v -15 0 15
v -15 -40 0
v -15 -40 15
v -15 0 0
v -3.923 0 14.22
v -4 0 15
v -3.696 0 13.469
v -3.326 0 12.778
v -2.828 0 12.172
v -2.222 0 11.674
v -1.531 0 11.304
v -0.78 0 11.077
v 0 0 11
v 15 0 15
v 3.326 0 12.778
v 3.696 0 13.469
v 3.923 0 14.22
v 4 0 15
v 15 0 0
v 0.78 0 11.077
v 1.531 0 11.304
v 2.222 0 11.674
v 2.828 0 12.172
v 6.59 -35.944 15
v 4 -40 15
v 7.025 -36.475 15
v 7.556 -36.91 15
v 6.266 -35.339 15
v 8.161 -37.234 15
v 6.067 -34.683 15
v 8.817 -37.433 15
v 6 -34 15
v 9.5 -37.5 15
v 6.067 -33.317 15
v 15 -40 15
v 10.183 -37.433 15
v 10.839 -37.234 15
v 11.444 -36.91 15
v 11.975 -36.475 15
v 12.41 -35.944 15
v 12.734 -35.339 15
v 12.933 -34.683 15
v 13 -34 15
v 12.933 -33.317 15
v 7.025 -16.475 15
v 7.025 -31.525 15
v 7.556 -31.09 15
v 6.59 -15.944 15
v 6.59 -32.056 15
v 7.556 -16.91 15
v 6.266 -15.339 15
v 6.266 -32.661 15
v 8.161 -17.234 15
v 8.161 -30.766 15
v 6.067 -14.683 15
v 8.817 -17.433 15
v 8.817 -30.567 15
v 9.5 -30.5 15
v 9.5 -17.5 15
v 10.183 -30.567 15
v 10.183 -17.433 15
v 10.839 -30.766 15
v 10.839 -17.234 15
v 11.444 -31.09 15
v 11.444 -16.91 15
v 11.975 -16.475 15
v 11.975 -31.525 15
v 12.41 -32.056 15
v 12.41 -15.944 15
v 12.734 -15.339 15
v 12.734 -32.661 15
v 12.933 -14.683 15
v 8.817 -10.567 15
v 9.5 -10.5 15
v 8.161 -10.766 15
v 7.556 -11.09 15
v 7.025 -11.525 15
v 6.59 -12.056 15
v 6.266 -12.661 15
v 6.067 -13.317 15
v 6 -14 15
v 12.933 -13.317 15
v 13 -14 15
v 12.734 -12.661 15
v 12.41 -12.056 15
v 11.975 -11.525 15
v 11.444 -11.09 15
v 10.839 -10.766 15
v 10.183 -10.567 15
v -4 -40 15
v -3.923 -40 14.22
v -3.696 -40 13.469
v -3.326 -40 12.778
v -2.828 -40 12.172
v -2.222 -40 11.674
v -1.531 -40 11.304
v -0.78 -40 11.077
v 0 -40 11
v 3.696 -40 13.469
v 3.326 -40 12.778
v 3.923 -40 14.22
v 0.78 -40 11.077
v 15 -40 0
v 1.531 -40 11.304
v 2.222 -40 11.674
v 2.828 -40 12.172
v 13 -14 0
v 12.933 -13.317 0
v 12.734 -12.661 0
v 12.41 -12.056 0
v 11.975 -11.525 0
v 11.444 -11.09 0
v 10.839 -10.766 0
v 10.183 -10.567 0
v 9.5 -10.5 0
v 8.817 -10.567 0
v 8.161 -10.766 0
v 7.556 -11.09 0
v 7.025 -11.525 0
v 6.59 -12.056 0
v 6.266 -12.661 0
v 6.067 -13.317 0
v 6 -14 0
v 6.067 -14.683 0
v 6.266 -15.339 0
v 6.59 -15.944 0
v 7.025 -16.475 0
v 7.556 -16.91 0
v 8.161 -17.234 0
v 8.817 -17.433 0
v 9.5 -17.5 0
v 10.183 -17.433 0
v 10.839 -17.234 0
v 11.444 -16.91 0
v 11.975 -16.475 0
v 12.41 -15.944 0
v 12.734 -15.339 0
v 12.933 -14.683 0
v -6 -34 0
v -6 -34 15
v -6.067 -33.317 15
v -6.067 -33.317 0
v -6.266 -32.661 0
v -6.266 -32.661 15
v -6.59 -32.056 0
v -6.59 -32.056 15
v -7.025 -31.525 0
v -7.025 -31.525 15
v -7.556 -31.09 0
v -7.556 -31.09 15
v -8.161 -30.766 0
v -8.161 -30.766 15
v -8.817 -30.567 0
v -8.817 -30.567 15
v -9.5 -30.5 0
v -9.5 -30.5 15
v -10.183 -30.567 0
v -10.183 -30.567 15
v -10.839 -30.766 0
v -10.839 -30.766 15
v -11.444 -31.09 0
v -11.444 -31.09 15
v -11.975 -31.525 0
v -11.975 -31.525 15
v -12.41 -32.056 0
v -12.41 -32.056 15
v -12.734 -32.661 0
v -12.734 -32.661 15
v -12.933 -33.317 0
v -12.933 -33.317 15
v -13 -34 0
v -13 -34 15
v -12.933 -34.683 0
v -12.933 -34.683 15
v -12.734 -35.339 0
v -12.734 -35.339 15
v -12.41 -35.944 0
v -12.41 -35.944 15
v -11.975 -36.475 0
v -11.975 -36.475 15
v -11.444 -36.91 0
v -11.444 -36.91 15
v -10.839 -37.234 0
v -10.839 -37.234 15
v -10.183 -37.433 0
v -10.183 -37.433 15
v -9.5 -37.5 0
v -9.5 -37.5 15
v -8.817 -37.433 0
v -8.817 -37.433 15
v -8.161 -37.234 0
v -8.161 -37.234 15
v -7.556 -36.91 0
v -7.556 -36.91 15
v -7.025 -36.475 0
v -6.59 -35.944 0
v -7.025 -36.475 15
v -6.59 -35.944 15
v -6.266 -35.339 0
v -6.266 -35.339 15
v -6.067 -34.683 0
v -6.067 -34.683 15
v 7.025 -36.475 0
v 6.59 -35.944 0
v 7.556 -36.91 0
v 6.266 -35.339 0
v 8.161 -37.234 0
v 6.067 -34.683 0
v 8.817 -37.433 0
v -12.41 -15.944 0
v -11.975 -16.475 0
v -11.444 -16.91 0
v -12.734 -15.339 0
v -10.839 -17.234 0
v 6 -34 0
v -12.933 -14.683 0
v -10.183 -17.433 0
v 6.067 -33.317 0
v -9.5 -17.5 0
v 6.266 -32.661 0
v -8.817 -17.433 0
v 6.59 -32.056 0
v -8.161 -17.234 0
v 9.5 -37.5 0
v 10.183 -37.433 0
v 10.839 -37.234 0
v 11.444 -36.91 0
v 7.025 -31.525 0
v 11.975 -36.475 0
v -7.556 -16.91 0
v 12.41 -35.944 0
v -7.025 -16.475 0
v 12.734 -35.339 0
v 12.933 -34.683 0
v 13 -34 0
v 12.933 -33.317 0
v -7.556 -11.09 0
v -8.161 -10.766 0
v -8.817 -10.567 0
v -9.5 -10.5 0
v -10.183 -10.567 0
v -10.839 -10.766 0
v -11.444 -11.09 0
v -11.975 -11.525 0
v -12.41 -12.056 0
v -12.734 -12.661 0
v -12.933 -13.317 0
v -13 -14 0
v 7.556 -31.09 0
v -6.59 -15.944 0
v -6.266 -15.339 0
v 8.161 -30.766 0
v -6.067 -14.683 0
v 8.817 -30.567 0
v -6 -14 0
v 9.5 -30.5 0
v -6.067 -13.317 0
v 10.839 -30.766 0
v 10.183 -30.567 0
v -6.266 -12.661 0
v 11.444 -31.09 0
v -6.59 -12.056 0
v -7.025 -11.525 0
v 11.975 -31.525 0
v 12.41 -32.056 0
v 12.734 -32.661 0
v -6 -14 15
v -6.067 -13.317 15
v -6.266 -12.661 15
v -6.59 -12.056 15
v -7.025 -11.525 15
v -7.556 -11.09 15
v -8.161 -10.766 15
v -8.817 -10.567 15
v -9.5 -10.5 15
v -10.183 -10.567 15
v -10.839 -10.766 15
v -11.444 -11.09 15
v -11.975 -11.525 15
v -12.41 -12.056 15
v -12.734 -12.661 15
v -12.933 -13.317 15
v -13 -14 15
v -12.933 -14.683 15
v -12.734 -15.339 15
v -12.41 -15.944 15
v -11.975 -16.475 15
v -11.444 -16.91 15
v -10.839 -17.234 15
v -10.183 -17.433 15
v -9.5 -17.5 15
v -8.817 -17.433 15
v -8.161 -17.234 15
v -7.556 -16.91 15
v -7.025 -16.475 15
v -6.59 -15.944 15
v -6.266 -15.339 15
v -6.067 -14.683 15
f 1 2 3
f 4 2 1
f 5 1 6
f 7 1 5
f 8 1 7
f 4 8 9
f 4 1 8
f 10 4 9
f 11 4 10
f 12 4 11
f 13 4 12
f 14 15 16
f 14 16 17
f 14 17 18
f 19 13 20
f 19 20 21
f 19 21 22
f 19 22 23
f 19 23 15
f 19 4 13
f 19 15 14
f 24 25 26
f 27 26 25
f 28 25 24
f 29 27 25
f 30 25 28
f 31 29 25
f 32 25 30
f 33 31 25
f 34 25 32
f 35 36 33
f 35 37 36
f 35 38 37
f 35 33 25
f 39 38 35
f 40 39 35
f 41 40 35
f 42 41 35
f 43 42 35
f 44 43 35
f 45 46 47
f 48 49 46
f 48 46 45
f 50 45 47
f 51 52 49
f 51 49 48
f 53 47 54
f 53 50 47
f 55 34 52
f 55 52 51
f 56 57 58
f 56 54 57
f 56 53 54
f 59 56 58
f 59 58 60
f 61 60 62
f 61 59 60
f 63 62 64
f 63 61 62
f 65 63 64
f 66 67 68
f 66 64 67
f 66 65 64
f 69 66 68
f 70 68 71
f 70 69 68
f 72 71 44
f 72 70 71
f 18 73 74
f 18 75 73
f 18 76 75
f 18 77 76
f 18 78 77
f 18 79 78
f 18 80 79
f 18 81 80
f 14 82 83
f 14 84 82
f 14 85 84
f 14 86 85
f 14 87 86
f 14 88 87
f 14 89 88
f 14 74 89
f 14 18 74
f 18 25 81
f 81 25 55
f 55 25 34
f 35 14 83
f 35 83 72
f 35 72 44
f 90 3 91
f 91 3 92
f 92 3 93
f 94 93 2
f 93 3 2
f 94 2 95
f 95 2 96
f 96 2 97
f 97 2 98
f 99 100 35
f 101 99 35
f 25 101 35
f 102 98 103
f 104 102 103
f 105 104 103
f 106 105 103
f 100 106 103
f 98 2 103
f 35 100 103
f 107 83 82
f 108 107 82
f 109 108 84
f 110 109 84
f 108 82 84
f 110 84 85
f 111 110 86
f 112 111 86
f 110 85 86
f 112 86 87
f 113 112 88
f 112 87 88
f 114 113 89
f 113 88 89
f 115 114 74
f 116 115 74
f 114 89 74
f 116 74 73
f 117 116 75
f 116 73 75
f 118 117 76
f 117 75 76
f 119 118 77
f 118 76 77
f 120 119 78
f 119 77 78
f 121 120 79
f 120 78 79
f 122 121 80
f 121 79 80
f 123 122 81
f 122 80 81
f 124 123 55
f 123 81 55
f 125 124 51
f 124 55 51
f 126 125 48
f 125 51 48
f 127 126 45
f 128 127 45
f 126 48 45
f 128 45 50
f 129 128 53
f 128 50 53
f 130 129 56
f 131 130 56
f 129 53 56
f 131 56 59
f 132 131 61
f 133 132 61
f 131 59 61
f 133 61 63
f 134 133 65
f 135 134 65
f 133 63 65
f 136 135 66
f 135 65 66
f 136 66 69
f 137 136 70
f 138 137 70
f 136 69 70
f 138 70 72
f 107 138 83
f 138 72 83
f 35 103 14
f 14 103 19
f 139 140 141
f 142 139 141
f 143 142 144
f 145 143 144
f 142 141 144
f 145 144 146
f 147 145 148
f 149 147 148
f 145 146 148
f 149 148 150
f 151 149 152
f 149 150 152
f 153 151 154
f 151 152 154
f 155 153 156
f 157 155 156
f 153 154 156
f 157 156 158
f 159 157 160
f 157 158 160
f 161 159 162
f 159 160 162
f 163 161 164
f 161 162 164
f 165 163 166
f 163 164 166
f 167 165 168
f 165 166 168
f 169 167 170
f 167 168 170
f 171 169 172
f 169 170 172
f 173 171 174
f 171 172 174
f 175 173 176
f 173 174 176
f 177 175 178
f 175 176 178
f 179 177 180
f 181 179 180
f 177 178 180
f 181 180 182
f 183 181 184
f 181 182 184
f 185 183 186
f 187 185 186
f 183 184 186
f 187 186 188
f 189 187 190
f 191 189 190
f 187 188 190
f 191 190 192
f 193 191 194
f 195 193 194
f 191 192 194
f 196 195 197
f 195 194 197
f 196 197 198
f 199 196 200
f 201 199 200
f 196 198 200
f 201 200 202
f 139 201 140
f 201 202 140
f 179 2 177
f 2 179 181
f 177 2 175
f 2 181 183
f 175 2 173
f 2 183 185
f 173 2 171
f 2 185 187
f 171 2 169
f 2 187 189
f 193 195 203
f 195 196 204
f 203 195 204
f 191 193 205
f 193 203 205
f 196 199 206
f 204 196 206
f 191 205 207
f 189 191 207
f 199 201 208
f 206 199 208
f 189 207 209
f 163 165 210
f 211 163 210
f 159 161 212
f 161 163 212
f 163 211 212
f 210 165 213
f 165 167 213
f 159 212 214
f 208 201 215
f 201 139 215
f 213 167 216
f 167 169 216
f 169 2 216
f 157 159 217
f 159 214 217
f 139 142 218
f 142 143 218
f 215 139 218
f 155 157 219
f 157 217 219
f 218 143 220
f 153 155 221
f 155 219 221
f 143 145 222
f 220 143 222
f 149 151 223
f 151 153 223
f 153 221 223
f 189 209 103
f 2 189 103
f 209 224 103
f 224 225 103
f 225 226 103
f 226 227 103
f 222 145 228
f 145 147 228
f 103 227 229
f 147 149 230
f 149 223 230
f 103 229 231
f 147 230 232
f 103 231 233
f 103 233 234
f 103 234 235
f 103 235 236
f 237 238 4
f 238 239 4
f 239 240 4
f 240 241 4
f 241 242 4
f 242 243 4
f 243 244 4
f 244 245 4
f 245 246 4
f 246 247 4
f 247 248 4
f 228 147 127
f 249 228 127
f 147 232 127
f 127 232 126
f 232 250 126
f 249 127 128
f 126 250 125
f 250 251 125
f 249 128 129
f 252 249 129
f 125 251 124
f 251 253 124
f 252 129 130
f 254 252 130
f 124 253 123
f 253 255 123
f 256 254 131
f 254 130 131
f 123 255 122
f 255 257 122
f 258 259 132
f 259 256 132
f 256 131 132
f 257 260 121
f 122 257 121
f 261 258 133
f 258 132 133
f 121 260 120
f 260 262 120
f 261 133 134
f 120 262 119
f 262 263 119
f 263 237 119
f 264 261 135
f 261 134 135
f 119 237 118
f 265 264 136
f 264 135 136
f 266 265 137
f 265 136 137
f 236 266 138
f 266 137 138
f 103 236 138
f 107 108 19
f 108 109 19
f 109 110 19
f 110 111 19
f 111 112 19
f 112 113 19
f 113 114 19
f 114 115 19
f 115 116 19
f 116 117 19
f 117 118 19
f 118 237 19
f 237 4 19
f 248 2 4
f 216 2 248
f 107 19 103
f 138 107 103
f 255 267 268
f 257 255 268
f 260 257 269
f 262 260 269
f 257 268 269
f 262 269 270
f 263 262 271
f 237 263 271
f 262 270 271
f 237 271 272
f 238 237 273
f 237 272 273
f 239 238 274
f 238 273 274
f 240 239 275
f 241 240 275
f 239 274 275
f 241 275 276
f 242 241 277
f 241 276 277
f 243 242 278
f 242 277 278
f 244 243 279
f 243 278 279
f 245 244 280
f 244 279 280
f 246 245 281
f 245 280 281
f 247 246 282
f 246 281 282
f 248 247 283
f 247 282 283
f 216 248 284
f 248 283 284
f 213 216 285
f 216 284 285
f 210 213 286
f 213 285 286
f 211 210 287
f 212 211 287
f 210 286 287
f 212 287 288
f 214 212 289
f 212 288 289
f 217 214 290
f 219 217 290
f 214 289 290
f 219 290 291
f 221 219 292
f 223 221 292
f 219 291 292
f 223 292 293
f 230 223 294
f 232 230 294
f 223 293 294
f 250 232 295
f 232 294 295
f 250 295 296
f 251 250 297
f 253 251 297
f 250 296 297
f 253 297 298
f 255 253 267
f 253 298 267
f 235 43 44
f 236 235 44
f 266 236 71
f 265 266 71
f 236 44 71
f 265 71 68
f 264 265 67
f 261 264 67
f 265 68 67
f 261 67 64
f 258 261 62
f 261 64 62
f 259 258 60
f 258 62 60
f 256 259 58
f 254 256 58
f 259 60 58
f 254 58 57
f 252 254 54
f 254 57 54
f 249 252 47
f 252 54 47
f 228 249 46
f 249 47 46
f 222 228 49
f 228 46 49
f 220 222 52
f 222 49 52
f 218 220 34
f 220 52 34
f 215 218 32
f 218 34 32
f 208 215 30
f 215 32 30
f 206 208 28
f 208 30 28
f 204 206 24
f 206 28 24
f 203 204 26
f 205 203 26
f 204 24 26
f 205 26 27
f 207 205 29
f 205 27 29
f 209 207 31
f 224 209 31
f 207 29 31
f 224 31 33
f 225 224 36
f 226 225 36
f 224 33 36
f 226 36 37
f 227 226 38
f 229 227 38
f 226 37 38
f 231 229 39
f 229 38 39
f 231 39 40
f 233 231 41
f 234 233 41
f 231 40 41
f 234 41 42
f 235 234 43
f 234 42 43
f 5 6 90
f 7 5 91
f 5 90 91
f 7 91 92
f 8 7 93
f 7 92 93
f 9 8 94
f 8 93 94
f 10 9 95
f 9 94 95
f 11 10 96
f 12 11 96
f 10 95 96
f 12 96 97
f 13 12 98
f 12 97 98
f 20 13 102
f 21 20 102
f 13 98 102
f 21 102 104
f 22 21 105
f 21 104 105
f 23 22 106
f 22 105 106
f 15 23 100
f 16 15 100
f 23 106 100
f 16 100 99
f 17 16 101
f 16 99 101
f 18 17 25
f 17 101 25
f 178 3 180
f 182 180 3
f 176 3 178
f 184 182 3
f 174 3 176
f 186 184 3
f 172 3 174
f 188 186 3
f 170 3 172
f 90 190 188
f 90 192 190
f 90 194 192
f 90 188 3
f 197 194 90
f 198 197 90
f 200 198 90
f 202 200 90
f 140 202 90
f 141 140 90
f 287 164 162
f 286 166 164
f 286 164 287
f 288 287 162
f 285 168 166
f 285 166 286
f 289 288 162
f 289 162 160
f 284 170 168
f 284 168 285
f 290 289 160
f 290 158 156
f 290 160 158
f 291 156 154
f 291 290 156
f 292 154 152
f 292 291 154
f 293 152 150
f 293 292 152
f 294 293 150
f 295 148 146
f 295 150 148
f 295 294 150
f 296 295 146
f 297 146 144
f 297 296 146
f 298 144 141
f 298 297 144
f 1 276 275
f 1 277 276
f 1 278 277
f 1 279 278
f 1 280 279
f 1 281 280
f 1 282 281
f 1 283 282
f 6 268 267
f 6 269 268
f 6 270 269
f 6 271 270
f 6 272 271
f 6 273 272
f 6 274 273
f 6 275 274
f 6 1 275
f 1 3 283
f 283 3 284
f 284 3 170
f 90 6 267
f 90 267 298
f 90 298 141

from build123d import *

# Parameters (mm, degrees)
F0_W     = 30
F0_H     = 40
F1_DEPTH = 15
F3_DEPTH = 40
F4_R     = 3.5
F5_DEPTH = 15


with BuildPart() as f1:
    # F0 (on Top) → F1 (new body)
    with BuildSketch(Plane.XY):
        with Locations((0, -20)):
            Rectangle(F0_W, F0_H)
    extrude(amount=F1_DEPTH)

    # F2 (on face) → F3 (cut, through all)
    with BuildSketch(Plane.XZ.offset(40)):
        with BuildLine():
            ThreePointArc((-4, 15), (0, 11), (4, 15))
            Line((4, 15), (-4, 15))
        make_face()
    extrude(amount=-F3_DEPTH, mode=Mode.SUBTRACT)

    # F4 (on face) → F5 (cut, through all)
    with BuildSketch(Plane.XY.offset(15)):
        with Locations((-9.5, -34)):
            Circle(F4_R)
        with Locations((-9.5, -14)):
            Circle(F4_R)
        with Locations((9.5, -14)):
            Circle(F4_R)
        with Locations((9.5, -34)):
            Circle(F4_R)
    extrude(amount=-F5_DEPTH, mode=Mode.SUBTRACT)


solid = f1.part
